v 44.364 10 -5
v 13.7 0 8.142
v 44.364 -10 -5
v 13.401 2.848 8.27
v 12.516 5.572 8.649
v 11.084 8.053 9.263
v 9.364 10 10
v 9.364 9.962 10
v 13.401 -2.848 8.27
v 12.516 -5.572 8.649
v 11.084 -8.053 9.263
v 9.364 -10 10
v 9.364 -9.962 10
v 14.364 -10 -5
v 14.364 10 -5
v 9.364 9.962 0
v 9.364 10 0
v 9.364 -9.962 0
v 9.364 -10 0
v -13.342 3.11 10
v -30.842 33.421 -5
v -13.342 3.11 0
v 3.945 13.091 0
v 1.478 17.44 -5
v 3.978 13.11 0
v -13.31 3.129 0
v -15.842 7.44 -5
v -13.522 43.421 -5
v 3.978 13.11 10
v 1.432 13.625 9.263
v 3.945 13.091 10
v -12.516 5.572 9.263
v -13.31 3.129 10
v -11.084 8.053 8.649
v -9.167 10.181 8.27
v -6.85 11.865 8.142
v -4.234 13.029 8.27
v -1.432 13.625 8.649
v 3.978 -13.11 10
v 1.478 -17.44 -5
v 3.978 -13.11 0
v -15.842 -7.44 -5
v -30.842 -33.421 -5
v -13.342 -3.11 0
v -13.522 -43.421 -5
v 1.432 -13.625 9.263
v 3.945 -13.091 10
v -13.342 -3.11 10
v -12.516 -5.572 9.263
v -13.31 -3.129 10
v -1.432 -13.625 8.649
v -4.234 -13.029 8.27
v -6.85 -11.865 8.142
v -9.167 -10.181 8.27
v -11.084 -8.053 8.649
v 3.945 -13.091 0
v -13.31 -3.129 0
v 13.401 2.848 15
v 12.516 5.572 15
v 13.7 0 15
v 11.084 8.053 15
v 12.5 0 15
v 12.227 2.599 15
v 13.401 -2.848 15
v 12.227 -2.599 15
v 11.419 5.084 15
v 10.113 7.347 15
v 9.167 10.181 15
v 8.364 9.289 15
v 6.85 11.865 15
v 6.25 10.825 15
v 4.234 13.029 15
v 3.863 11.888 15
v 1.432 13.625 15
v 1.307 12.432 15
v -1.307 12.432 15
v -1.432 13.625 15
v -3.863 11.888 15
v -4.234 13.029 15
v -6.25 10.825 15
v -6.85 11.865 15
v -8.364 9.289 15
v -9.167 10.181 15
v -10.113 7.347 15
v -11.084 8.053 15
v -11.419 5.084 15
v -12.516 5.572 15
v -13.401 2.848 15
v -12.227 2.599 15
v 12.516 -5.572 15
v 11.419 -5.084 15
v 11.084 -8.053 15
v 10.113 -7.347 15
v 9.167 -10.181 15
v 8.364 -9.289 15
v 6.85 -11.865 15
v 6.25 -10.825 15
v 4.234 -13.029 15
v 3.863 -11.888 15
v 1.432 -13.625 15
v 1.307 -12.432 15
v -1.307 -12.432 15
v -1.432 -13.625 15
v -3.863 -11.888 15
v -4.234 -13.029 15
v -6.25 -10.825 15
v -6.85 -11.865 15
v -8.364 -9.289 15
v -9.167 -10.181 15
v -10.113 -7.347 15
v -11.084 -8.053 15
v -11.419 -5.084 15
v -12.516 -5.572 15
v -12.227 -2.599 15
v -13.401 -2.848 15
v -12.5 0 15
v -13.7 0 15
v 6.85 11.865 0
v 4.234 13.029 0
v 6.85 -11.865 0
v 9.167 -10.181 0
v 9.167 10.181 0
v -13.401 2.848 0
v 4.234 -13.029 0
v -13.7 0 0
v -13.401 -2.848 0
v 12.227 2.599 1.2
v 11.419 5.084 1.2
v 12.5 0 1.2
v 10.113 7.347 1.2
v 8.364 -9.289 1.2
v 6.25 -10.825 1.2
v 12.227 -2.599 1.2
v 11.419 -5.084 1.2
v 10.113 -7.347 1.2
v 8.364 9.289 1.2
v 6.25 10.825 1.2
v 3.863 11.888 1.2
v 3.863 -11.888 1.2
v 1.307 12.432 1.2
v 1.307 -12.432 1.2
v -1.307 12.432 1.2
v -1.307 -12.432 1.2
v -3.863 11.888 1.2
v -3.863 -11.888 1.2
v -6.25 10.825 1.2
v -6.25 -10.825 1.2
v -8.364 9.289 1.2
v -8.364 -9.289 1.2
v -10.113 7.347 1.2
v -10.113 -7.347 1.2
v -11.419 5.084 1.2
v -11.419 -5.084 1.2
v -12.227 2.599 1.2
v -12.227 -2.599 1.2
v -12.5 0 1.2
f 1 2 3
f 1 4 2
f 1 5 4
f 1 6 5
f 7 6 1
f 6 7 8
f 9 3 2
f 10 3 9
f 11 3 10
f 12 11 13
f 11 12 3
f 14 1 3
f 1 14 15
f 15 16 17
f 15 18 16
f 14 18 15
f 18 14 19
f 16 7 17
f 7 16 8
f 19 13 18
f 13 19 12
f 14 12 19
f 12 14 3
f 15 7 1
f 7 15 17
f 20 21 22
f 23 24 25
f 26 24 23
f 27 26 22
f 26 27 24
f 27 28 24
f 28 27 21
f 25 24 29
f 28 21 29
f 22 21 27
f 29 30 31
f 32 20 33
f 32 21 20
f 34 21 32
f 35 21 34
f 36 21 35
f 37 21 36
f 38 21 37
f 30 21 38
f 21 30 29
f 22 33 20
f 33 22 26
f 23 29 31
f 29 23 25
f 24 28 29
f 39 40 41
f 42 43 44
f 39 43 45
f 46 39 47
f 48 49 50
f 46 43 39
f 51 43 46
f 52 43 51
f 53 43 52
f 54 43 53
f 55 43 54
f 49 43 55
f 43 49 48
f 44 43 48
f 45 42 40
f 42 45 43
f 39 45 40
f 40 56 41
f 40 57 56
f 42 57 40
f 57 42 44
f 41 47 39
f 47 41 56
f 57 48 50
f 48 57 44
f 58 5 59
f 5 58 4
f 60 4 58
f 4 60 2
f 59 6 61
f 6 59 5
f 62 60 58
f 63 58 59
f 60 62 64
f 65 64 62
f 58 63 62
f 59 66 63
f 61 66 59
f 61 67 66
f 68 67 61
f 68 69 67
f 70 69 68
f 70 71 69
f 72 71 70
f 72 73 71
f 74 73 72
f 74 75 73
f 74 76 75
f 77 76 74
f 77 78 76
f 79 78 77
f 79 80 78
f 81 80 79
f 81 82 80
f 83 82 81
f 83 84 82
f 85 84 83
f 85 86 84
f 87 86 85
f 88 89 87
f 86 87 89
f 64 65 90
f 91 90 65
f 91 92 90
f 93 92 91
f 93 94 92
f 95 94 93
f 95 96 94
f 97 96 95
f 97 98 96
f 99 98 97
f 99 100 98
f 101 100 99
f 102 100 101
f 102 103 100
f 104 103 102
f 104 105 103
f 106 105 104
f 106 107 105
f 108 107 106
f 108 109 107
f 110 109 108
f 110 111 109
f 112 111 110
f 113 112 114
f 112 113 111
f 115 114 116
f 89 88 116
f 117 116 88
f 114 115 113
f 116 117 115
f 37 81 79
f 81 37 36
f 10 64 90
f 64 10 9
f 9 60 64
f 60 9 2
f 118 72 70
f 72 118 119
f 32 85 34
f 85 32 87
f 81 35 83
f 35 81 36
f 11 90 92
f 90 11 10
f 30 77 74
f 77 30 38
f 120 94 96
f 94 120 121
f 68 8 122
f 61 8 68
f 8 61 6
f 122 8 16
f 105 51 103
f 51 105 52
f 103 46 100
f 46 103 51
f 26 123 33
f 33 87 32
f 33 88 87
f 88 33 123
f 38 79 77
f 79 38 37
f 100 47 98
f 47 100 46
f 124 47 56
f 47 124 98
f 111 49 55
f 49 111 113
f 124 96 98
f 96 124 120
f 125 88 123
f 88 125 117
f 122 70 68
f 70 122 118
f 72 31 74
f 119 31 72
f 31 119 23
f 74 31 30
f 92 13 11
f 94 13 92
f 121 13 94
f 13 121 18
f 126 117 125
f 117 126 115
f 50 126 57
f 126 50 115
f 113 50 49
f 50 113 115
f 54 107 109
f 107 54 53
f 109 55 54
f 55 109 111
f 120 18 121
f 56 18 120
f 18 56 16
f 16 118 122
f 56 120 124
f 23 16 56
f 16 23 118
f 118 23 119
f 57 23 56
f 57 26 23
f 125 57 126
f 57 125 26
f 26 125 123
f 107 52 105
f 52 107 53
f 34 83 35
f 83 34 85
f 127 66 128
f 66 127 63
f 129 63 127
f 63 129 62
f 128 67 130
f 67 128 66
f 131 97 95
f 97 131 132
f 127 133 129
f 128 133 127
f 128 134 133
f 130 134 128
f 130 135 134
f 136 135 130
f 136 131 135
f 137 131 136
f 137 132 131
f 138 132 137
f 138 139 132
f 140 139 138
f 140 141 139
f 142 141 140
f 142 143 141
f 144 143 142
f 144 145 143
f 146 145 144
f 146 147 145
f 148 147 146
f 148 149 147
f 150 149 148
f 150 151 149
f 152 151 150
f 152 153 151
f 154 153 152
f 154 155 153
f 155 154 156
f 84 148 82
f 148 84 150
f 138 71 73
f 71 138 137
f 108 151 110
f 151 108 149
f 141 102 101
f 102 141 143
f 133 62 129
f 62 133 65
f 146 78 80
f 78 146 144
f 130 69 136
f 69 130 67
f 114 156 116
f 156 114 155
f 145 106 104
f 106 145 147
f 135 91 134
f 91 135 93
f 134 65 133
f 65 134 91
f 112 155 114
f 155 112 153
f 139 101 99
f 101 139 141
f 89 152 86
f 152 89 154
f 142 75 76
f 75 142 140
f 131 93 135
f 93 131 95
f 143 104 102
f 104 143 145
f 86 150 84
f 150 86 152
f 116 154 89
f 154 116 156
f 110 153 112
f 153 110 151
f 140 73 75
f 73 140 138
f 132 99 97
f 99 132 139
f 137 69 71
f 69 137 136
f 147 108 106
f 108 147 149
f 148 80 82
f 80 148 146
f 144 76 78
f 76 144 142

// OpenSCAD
// [FL_INDEX: keywords="openscad, 3d_parametric, Candlestick__rolled_honeycomb_wax_candle, csg_solid" | COT="Parametric OpenSCAD design from 3DCodeverse"]
// Title: Candlestick (rolled honeycomb wax candle)

/*
 * Candlestick, v0.42
 *
 * by Alex Franke (CodeCreations), Feb 2014
 * http://www.theFrankes.com
 * 
 * Licenced under Creative Commons Attribution - Non-Commercial - Share Alike 3.0 
 * 
 * INSTRUCTIONS: Choose some values in the "User-defined values" section, and render. 
 * 
 * v1.00, Feb 8, 2014: Initial Release.
 */
 
/////////////////////////////////////////////////////////////////////////////
// User-defined values... 
/////////////////////////////////////////////////////////////////////////////
 
/* [Global] */

// Diameter of the candle
candleDiameter = 25;

// Height of the tube that holds the candle
height = 15;

// Thickness of the tube material 
thickness = 1.2;

// Number of candle legs
legs = 3;

// Length of candle legs
legLength = 35;

// Thickness of candle legs
legThickness = 20;

// Total height of candle legs
legHeight = 10;  

// Height of tube above the surface. 
holderHeight = 5; 

// Curve quality 
$fn=30;

/* [Hidden] */

r = candleDiameter/2 + thickness;
s = legThickness/2;  

// how far in do we move the legs so the edges meet the edge of the cylinder?
x = r - sqrt(  pow(r,2) - pow(s,2) );

/////////////////////////////////////////////////////////////////////////////
// Modules 
/////////////////////////////////////////////////////////////////////////////


difference() {
	union() {
		cylinder(h=height, r=candleDiameter/2+thickness);
		for(i=[0:legs-1]) {
			rotate([0,0,360/legs*i]) 
			translate([candleDiameter/2+thickness-x,0,0]) 
				leg();
		}
	}
	translate([0,0,thickness]) 
	cylinder(h=height, r=candleDiameter/2);
}

module leg() {
	translate([0,legThickness/2,0]) 
	rotate([90,0,0])
	linear_extrude( height=legThickness )
	polygon(points=[
		[0,0],
		[0,legHeight],
		[legLength,-holderHeight],
		[holderHeight,-holderHeight]
	]); 
}
